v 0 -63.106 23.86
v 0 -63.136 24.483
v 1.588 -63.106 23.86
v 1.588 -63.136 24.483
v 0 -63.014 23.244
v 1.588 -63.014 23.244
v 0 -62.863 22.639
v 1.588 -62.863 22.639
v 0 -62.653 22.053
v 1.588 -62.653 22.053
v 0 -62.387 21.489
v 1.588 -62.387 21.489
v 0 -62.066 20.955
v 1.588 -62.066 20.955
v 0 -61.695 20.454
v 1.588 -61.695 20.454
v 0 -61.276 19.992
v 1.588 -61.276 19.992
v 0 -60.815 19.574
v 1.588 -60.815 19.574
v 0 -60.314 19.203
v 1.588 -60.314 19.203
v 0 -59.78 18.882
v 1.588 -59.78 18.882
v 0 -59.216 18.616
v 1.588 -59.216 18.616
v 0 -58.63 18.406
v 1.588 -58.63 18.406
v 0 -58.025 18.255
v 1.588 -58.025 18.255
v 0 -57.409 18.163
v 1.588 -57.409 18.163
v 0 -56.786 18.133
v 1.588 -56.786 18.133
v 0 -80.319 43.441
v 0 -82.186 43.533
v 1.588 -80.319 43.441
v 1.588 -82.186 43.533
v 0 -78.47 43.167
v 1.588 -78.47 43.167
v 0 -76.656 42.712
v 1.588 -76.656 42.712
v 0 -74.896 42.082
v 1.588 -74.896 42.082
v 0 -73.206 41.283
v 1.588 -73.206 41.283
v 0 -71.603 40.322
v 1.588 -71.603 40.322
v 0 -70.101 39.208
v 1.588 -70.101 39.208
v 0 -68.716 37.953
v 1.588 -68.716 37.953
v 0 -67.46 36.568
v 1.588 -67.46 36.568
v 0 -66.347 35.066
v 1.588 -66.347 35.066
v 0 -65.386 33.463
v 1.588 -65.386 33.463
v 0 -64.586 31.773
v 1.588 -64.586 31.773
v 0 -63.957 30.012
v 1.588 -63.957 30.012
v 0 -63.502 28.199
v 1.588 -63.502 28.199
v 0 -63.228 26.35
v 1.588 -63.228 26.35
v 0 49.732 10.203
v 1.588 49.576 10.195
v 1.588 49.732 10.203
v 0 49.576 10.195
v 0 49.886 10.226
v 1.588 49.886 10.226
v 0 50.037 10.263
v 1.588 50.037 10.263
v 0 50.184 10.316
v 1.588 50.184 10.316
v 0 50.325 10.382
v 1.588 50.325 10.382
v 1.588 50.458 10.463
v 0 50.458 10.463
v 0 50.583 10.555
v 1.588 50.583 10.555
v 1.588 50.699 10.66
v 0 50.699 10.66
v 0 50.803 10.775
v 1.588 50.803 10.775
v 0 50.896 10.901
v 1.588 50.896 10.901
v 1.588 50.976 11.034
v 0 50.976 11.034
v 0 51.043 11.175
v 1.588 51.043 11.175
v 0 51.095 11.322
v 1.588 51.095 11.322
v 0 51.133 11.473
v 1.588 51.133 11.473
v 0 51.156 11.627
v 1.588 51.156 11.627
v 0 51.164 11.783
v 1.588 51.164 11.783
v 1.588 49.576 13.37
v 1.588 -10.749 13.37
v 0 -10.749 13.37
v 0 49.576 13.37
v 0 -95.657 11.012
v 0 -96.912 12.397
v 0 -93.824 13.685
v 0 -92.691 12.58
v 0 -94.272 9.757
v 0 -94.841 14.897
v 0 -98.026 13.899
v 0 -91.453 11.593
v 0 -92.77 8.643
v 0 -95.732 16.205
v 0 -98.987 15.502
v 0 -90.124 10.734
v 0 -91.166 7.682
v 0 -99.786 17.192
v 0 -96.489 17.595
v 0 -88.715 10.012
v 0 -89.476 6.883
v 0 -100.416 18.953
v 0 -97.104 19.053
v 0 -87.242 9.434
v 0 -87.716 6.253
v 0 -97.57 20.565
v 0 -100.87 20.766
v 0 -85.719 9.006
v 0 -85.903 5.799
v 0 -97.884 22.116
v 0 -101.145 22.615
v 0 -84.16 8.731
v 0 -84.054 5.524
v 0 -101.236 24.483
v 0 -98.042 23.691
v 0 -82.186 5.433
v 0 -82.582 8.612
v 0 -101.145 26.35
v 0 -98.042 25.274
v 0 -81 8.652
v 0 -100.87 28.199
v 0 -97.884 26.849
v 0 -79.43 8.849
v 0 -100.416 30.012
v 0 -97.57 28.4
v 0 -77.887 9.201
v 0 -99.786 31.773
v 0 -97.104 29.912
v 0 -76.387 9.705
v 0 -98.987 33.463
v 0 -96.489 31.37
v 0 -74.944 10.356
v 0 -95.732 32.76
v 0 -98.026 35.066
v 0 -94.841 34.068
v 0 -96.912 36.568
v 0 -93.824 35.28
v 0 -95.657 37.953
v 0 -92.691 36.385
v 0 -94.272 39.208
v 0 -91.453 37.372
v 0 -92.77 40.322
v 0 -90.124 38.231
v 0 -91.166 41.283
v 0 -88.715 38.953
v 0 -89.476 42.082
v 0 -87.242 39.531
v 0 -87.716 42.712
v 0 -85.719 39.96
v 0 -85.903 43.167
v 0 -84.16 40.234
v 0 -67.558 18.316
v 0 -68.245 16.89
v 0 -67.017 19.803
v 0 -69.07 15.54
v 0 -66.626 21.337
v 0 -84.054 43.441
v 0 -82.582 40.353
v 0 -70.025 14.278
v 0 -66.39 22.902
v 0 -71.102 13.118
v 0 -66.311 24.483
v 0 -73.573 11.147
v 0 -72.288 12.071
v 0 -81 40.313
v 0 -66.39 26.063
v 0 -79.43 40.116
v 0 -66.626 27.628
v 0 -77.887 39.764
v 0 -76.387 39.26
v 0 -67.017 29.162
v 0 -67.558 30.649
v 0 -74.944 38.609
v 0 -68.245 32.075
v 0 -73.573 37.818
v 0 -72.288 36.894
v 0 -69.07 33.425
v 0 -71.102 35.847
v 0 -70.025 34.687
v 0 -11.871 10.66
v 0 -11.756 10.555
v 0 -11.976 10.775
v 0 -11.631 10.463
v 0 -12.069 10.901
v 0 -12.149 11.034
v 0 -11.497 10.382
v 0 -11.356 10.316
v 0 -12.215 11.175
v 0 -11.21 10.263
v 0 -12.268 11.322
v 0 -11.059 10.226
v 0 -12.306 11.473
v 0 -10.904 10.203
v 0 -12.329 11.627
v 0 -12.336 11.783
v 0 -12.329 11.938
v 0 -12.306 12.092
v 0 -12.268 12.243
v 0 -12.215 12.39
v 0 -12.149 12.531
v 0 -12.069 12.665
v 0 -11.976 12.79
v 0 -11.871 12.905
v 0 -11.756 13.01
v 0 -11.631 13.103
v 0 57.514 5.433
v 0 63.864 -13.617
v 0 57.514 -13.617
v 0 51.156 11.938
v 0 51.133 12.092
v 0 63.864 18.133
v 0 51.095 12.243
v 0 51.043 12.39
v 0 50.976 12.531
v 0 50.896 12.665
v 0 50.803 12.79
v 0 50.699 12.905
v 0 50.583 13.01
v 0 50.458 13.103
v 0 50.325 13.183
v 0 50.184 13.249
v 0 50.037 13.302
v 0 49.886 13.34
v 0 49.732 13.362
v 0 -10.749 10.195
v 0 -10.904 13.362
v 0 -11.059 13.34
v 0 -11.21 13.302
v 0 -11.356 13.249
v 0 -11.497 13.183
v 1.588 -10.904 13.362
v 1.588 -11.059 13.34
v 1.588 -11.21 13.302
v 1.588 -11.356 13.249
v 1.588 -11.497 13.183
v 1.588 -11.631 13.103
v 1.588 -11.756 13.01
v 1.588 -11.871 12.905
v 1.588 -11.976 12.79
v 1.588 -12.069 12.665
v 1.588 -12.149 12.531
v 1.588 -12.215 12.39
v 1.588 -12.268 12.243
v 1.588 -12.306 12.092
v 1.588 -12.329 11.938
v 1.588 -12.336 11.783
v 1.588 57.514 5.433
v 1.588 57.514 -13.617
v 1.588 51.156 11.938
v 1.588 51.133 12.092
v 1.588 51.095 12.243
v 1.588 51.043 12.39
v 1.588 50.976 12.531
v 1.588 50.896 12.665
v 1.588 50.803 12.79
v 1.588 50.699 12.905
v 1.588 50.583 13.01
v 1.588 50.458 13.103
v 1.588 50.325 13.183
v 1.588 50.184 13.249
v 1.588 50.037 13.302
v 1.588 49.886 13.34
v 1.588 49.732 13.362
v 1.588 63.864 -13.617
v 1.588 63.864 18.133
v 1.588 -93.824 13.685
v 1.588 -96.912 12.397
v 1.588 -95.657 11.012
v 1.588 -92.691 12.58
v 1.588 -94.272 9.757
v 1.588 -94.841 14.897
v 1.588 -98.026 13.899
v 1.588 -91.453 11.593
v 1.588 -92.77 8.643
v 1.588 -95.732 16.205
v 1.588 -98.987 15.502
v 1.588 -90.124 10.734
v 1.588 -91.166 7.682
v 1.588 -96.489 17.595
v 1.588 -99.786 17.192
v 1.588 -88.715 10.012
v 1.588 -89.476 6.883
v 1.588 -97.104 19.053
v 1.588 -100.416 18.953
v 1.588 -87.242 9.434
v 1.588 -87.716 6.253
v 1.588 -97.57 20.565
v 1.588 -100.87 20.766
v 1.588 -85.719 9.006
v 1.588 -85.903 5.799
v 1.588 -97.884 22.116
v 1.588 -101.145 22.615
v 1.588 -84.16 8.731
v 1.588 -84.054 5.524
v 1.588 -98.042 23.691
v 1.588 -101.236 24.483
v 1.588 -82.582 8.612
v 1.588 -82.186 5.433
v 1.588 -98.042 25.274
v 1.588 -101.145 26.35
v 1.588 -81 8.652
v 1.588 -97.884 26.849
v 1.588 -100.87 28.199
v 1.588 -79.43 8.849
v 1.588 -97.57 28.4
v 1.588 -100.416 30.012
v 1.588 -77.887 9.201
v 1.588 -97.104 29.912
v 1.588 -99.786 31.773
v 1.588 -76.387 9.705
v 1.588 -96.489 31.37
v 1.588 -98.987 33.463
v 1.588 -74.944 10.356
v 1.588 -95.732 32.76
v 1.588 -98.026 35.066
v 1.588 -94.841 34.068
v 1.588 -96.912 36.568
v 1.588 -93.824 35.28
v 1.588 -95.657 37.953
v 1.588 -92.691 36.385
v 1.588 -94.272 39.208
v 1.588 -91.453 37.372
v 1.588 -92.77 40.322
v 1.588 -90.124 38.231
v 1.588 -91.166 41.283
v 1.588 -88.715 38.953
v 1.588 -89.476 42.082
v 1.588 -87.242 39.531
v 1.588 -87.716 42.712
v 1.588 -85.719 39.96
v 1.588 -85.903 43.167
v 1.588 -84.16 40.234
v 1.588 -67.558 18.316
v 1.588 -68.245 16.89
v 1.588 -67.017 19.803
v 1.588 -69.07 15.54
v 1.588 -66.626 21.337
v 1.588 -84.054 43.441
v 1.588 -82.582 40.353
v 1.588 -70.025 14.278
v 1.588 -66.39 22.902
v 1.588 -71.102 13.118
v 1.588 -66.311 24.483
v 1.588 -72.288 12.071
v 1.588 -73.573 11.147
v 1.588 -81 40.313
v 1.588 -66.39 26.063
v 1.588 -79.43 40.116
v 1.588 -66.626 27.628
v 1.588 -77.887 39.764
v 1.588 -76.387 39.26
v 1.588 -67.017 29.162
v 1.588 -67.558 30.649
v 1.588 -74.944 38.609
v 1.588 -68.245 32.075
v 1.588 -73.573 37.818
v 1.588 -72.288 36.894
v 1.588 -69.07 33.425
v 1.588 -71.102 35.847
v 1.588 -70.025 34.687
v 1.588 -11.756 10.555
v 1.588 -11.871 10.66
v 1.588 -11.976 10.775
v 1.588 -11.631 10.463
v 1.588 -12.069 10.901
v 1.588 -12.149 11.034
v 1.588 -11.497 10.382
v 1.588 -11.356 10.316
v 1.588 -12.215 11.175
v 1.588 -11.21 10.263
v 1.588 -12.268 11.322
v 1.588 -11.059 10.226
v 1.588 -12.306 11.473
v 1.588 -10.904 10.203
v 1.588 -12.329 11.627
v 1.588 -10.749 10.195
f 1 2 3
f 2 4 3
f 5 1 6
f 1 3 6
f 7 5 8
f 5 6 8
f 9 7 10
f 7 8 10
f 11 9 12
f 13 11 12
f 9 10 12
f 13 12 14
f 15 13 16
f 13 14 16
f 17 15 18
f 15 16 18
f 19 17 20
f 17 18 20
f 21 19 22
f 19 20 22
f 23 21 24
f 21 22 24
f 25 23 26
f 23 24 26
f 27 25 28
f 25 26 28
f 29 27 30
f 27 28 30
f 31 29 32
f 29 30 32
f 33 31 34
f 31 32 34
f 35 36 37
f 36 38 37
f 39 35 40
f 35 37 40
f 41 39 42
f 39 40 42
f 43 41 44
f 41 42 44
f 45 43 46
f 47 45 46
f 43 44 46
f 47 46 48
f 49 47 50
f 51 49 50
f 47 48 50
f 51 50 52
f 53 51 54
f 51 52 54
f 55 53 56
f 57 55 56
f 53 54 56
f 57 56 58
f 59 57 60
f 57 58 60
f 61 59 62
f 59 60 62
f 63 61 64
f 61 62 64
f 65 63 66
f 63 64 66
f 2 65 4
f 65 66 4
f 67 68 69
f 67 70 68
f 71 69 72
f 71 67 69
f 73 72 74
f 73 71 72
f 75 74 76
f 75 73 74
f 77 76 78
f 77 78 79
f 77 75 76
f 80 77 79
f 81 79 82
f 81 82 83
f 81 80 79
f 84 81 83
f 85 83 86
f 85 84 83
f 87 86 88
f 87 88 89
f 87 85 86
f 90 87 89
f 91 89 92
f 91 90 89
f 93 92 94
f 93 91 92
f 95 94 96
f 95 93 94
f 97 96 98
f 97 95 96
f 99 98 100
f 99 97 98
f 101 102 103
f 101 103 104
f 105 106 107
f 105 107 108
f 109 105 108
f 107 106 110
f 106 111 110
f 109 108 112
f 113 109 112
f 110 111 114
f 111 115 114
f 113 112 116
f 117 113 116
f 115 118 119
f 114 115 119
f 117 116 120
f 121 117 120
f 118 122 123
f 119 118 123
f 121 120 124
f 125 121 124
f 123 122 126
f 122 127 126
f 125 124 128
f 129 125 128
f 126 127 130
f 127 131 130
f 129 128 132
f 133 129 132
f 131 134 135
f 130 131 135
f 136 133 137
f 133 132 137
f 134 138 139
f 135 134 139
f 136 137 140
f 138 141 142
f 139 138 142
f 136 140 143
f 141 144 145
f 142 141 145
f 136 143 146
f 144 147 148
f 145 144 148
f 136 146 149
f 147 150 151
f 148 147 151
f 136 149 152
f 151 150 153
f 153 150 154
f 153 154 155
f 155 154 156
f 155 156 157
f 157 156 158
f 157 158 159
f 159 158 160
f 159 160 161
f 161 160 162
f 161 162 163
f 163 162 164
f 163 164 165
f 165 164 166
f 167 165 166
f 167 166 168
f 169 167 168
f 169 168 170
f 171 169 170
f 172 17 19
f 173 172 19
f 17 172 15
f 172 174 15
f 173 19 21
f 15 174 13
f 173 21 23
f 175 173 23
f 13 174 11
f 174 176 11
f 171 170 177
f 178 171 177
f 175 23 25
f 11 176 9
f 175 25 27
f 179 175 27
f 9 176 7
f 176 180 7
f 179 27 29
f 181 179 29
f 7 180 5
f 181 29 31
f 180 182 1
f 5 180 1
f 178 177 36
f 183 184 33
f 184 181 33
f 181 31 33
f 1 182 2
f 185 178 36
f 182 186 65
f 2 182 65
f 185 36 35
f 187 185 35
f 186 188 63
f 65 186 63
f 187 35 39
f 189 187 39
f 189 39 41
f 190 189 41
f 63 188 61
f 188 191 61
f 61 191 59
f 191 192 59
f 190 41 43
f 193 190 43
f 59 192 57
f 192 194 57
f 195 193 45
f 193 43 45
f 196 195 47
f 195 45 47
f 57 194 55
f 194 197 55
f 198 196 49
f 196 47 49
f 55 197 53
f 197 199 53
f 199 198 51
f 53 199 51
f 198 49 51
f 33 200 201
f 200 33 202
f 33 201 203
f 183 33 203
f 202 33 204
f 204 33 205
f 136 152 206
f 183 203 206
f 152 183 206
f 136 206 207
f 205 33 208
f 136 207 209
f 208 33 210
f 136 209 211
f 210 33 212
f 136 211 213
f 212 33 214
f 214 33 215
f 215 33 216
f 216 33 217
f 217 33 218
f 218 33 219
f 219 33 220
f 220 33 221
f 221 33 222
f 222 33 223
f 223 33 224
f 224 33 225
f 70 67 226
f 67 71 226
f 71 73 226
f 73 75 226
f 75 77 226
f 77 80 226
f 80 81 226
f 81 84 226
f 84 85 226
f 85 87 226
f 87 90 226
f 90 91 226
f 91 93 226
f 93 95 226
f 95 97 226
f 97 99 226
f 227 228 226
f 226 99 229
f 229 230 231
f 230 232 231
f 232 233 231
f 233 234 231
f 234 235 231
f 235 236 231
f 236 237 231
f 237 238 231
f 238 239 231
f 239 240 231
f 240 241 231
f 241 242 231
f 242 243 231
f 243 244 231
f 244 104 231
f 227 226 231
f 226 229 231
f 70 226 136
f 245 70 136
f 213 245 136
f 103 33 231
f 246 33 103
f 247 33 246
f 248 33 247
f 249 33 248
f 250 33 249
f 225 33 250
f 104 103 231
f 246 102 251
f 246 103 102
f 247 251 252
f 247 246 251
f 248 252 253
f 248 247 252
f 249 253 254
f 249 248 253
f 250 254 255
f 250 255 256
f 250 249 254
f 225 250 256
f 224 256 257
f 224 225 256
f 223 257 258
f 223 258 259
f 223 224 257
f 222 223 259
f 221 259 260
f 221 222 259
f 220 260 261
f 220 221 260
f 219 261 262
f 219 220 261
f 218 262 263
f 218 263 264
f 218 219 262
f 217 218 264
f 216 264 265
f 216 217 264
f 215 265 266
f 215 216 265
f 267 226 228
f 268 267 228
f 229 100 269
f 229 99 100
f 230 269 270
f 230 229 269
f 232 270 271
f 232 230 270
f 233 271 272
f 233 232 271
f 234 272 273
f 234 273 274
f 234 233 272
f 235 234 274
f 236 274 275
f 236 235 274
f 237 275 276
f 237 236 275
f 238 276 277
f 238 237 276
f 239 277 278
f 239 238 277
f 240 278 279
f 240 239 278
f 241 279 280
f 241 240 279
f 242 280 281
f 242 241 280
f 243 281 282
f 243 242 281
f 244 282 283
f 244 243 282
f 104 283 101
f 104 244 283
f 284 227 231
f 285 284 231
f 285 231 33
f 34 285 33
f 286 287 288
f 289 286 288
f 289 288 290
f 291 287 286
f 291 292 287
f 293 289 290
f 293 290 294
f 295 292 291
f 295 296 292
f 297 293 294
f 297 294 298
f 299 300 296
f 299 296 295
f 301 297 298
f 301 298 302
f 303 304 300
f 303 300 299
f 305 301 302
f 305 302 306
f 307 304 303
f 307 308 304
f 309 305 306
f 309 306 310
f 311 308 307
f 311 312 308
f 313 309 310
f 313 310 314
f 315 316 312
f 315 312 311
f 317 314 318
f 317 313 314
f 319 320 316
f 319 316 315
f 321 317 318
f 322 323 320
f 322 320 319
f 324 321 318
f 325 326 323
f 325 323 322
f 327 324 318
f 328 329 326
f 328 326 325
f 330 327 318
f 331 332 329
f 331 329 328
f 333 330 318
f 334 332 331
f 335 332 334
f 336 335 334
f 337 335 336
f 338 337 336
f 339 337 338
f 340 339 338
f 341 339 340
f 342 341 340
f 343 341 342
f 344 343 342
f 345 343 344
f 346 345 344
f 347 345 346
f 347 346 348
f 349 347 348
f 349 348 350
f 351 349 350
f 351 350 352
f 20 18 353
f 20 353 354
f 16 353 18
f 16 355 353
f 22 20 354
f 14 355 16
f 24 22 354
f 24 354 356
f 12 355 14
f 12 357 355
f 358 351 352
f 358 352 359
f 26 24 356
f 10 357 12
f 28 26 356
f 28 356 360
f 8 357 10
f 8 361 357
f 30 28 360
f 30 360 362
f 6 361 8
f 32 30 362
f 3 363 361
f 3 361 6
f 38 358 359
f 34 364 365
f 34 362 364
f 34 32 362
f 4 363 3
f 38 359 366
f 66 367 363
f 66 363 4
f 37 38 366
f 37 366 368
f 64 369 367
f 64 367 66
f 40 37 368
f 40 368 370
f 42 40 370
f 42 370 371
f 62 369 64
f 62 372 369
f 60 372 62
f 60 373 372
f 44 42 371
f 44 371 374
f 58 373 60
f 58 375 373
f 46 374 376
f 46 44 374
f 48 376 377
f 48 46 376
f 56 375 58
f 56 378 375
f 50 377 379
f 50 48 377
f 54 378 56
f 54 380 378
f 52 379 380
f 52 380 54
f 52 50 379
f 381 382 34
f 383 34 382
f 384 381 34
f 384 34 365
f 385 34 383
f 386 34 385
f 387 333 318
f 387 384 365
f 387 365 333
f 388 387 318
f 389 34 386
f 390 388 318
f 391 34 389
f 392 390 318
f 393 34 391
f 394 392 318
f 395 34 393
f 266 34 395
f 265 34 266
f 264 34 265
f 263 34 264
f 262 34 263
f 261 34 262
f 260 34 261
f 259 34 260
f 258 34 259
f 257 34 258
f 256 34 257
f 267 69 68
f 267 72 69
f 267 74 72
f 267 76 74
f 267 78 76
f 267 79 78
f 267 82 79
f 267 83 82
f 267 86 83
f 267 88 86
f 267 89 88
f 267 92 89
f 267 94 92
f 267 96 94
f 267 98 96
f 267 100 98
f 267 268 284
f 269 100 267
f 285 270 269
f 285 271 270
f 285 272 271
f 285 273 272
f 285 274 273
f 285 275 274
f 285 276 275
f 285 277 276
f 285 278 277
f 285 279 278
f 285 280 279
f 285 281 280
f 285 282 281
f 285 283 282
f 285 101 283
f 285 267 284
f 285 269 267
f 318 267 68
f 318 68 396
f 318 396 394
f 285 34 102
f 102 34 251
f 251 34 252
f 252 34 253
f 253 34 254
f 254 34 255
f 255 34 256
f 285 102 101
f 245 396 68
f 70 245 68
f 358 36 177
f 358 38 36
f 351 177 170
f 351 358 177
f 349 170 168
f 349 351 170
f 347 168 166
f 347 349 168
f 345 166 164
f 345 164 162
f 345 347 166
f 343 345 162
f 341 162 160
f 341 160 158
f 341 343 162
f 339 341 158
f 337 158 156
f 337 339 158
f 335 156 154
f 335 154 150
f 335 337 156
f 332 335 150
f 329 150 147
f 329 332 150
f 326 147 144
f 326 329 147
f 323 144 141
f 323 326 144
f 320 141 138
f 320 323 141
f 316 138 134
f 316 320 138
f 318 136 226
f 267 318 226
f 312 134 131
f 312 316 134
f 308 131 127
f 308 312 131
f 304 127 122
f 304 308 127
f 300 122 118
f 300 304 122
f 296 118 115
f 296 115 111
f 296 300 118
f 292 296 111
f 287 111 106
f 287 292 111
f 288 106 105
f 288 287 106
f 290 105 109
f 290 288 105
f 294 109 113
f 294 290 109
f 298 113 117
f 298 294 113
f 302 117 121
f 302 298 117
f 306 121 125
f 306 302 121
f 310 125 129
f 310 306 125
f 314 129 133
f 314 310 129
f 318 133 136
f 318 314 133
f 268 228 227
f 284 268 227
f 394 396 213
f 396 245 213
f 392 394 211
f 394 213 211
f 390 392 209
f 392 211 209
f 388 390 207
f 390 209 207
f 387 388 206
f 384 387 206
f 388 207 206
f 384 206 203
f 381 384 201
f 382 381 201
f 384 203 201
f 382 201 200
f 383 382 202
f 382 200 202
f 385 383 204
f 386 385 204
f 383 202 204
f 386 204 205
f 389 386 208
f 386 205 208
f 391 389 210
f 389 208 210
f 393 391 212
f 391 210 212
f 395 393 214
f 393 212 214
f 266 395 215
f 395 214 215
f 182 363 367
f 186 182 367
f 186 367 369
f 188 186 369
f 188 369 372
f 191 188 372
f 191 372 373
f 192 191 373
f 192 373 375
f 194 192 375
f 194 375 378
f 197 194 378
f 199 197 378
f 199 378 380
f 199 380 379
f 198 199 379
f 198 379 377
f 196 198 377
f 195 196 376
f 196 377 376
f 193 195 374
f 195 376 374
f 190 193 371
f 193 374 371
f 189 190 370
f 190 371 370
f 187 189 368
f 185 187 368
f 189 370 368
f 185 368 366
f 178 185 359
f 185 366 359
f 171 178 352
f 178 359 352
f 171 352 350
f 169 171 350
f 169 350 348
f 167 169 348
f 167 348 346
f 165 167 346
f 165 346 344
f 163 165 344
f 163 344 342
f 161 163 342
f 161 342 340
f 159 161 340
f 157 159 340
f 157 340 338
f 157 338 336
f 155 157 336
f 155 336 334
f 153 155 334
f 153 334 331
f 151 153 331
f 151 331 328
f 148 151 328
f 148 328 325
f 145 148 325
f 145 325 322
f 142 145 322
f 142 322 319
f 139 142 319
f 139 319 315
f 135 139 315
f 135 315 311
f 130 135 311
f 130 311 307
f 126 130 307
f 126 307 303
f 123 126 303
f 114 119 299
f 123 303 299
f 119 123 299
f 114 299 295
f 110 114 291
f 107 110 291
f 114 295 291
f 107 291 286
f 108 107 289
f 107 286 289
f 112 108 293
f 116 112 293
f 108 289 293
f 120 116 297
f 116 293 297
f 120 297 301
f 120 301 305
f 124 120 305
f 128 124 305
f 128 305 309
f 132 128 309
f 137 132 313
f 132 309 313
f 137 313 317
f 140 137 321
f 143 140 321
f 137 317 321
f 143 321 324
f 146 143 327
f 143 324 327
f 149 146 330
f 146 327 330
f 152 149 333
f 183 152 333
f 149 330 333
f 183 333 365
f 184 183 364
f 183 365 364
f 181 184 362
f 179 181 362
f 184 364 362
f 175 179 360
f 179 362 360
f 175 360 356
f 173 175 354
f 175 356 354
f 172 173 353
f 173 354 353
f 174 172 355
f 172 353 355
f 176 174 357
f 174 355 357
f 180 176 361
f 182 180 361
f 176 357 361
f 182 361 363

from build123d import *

# Parameters (mm, degrees)
F1_DEPTH = 1.5875
F2_R     = 19.04999
F3_R     = 6.35
F4_R     = 15.875
F5_DEPTH = 25.4
F6_W     = 63.5
F6_H     = 3.175
F7_DEPTH = 25.4
F8_R     = 1.58749


# Not quite as in the source:
# - a fillet or chamfer is up to 0.001 mm smaller than in the source, because OpenCascade refuses the exact size


with BuildPart() as f1:
    # F0 (on Right) → F1 (new body)
    with BuildSketch(Plane.YZ):
        Polygon((-63.1363113923, 43.5325428513), (-101.2363113923, 43.5325428513), (-101.2363113923, 5.4325428513), (57.5136886077, 5.4325428513), (57.5136886077, -13.6174602094), (63.8636886077, -13.6174602094), (63.8636886077, 18.1325428513), (-63.1363113923, 18.1325428513), align=None)
    extrude(amount=F1_DEPTH)

    # F2 (radius 19.05 in the source; OpenCascade refuses exactly that, so slightly less here)
    f2_edges = [f1.edges().sort_by_distance(p)[0] for p in [
        (0.79375, -63.136311, 43.532543),
        (0.79375, -101.236311, 43.532543),
        (0.79375, -101.236311, 5.432543),
    ]]
    fillet(f2_edges, radius=F2_R)

    # F3
    f3_edges = [f1.edges().sort_by_distance(p)[0] for p in [
        (0.79375, -63.136311, 18.132543),
    ]]
    fillet(f3_edges, radius=F3_R)

    # F4 (on face) → F5 (cut)
    with BuildSketch(Plane.YZ.offset(1.5875)):
        with Locations((-82.1863113923, 24.4825428513)):
            Circle(F4_R)
    extrude(amount=-F5_DEPTH, mode=Mode.SUBTRACT)

    # F6 (on face) → F7 (cut)
    with BuildSketch(Plane.YZ.offset(1.5875)):
        with Locations((19.4136886077, 11.7825428513)):
            Rectangle(F6_W, F6_H)
    extrude(amount=-F7_DEPTH, mode=Mode.SUBTRACT)

    # F8 (radius 1.5875 in the source; OpenCascade refuses exactly that, so slightly less here)
    f8_edges = [f1.edges().sort_by_distance(p)[0] for p in [
        (0.79375, -12.336311, 13.370043),
        (0.79375, -12.336311, 10.195043),
        (0.79375, 51.163689, 10.195043),
        (0.79375, 51.163689, 13.370043),
    ]]
    fillet(f8_edges, radius=F8_R)


solid = f1.part
